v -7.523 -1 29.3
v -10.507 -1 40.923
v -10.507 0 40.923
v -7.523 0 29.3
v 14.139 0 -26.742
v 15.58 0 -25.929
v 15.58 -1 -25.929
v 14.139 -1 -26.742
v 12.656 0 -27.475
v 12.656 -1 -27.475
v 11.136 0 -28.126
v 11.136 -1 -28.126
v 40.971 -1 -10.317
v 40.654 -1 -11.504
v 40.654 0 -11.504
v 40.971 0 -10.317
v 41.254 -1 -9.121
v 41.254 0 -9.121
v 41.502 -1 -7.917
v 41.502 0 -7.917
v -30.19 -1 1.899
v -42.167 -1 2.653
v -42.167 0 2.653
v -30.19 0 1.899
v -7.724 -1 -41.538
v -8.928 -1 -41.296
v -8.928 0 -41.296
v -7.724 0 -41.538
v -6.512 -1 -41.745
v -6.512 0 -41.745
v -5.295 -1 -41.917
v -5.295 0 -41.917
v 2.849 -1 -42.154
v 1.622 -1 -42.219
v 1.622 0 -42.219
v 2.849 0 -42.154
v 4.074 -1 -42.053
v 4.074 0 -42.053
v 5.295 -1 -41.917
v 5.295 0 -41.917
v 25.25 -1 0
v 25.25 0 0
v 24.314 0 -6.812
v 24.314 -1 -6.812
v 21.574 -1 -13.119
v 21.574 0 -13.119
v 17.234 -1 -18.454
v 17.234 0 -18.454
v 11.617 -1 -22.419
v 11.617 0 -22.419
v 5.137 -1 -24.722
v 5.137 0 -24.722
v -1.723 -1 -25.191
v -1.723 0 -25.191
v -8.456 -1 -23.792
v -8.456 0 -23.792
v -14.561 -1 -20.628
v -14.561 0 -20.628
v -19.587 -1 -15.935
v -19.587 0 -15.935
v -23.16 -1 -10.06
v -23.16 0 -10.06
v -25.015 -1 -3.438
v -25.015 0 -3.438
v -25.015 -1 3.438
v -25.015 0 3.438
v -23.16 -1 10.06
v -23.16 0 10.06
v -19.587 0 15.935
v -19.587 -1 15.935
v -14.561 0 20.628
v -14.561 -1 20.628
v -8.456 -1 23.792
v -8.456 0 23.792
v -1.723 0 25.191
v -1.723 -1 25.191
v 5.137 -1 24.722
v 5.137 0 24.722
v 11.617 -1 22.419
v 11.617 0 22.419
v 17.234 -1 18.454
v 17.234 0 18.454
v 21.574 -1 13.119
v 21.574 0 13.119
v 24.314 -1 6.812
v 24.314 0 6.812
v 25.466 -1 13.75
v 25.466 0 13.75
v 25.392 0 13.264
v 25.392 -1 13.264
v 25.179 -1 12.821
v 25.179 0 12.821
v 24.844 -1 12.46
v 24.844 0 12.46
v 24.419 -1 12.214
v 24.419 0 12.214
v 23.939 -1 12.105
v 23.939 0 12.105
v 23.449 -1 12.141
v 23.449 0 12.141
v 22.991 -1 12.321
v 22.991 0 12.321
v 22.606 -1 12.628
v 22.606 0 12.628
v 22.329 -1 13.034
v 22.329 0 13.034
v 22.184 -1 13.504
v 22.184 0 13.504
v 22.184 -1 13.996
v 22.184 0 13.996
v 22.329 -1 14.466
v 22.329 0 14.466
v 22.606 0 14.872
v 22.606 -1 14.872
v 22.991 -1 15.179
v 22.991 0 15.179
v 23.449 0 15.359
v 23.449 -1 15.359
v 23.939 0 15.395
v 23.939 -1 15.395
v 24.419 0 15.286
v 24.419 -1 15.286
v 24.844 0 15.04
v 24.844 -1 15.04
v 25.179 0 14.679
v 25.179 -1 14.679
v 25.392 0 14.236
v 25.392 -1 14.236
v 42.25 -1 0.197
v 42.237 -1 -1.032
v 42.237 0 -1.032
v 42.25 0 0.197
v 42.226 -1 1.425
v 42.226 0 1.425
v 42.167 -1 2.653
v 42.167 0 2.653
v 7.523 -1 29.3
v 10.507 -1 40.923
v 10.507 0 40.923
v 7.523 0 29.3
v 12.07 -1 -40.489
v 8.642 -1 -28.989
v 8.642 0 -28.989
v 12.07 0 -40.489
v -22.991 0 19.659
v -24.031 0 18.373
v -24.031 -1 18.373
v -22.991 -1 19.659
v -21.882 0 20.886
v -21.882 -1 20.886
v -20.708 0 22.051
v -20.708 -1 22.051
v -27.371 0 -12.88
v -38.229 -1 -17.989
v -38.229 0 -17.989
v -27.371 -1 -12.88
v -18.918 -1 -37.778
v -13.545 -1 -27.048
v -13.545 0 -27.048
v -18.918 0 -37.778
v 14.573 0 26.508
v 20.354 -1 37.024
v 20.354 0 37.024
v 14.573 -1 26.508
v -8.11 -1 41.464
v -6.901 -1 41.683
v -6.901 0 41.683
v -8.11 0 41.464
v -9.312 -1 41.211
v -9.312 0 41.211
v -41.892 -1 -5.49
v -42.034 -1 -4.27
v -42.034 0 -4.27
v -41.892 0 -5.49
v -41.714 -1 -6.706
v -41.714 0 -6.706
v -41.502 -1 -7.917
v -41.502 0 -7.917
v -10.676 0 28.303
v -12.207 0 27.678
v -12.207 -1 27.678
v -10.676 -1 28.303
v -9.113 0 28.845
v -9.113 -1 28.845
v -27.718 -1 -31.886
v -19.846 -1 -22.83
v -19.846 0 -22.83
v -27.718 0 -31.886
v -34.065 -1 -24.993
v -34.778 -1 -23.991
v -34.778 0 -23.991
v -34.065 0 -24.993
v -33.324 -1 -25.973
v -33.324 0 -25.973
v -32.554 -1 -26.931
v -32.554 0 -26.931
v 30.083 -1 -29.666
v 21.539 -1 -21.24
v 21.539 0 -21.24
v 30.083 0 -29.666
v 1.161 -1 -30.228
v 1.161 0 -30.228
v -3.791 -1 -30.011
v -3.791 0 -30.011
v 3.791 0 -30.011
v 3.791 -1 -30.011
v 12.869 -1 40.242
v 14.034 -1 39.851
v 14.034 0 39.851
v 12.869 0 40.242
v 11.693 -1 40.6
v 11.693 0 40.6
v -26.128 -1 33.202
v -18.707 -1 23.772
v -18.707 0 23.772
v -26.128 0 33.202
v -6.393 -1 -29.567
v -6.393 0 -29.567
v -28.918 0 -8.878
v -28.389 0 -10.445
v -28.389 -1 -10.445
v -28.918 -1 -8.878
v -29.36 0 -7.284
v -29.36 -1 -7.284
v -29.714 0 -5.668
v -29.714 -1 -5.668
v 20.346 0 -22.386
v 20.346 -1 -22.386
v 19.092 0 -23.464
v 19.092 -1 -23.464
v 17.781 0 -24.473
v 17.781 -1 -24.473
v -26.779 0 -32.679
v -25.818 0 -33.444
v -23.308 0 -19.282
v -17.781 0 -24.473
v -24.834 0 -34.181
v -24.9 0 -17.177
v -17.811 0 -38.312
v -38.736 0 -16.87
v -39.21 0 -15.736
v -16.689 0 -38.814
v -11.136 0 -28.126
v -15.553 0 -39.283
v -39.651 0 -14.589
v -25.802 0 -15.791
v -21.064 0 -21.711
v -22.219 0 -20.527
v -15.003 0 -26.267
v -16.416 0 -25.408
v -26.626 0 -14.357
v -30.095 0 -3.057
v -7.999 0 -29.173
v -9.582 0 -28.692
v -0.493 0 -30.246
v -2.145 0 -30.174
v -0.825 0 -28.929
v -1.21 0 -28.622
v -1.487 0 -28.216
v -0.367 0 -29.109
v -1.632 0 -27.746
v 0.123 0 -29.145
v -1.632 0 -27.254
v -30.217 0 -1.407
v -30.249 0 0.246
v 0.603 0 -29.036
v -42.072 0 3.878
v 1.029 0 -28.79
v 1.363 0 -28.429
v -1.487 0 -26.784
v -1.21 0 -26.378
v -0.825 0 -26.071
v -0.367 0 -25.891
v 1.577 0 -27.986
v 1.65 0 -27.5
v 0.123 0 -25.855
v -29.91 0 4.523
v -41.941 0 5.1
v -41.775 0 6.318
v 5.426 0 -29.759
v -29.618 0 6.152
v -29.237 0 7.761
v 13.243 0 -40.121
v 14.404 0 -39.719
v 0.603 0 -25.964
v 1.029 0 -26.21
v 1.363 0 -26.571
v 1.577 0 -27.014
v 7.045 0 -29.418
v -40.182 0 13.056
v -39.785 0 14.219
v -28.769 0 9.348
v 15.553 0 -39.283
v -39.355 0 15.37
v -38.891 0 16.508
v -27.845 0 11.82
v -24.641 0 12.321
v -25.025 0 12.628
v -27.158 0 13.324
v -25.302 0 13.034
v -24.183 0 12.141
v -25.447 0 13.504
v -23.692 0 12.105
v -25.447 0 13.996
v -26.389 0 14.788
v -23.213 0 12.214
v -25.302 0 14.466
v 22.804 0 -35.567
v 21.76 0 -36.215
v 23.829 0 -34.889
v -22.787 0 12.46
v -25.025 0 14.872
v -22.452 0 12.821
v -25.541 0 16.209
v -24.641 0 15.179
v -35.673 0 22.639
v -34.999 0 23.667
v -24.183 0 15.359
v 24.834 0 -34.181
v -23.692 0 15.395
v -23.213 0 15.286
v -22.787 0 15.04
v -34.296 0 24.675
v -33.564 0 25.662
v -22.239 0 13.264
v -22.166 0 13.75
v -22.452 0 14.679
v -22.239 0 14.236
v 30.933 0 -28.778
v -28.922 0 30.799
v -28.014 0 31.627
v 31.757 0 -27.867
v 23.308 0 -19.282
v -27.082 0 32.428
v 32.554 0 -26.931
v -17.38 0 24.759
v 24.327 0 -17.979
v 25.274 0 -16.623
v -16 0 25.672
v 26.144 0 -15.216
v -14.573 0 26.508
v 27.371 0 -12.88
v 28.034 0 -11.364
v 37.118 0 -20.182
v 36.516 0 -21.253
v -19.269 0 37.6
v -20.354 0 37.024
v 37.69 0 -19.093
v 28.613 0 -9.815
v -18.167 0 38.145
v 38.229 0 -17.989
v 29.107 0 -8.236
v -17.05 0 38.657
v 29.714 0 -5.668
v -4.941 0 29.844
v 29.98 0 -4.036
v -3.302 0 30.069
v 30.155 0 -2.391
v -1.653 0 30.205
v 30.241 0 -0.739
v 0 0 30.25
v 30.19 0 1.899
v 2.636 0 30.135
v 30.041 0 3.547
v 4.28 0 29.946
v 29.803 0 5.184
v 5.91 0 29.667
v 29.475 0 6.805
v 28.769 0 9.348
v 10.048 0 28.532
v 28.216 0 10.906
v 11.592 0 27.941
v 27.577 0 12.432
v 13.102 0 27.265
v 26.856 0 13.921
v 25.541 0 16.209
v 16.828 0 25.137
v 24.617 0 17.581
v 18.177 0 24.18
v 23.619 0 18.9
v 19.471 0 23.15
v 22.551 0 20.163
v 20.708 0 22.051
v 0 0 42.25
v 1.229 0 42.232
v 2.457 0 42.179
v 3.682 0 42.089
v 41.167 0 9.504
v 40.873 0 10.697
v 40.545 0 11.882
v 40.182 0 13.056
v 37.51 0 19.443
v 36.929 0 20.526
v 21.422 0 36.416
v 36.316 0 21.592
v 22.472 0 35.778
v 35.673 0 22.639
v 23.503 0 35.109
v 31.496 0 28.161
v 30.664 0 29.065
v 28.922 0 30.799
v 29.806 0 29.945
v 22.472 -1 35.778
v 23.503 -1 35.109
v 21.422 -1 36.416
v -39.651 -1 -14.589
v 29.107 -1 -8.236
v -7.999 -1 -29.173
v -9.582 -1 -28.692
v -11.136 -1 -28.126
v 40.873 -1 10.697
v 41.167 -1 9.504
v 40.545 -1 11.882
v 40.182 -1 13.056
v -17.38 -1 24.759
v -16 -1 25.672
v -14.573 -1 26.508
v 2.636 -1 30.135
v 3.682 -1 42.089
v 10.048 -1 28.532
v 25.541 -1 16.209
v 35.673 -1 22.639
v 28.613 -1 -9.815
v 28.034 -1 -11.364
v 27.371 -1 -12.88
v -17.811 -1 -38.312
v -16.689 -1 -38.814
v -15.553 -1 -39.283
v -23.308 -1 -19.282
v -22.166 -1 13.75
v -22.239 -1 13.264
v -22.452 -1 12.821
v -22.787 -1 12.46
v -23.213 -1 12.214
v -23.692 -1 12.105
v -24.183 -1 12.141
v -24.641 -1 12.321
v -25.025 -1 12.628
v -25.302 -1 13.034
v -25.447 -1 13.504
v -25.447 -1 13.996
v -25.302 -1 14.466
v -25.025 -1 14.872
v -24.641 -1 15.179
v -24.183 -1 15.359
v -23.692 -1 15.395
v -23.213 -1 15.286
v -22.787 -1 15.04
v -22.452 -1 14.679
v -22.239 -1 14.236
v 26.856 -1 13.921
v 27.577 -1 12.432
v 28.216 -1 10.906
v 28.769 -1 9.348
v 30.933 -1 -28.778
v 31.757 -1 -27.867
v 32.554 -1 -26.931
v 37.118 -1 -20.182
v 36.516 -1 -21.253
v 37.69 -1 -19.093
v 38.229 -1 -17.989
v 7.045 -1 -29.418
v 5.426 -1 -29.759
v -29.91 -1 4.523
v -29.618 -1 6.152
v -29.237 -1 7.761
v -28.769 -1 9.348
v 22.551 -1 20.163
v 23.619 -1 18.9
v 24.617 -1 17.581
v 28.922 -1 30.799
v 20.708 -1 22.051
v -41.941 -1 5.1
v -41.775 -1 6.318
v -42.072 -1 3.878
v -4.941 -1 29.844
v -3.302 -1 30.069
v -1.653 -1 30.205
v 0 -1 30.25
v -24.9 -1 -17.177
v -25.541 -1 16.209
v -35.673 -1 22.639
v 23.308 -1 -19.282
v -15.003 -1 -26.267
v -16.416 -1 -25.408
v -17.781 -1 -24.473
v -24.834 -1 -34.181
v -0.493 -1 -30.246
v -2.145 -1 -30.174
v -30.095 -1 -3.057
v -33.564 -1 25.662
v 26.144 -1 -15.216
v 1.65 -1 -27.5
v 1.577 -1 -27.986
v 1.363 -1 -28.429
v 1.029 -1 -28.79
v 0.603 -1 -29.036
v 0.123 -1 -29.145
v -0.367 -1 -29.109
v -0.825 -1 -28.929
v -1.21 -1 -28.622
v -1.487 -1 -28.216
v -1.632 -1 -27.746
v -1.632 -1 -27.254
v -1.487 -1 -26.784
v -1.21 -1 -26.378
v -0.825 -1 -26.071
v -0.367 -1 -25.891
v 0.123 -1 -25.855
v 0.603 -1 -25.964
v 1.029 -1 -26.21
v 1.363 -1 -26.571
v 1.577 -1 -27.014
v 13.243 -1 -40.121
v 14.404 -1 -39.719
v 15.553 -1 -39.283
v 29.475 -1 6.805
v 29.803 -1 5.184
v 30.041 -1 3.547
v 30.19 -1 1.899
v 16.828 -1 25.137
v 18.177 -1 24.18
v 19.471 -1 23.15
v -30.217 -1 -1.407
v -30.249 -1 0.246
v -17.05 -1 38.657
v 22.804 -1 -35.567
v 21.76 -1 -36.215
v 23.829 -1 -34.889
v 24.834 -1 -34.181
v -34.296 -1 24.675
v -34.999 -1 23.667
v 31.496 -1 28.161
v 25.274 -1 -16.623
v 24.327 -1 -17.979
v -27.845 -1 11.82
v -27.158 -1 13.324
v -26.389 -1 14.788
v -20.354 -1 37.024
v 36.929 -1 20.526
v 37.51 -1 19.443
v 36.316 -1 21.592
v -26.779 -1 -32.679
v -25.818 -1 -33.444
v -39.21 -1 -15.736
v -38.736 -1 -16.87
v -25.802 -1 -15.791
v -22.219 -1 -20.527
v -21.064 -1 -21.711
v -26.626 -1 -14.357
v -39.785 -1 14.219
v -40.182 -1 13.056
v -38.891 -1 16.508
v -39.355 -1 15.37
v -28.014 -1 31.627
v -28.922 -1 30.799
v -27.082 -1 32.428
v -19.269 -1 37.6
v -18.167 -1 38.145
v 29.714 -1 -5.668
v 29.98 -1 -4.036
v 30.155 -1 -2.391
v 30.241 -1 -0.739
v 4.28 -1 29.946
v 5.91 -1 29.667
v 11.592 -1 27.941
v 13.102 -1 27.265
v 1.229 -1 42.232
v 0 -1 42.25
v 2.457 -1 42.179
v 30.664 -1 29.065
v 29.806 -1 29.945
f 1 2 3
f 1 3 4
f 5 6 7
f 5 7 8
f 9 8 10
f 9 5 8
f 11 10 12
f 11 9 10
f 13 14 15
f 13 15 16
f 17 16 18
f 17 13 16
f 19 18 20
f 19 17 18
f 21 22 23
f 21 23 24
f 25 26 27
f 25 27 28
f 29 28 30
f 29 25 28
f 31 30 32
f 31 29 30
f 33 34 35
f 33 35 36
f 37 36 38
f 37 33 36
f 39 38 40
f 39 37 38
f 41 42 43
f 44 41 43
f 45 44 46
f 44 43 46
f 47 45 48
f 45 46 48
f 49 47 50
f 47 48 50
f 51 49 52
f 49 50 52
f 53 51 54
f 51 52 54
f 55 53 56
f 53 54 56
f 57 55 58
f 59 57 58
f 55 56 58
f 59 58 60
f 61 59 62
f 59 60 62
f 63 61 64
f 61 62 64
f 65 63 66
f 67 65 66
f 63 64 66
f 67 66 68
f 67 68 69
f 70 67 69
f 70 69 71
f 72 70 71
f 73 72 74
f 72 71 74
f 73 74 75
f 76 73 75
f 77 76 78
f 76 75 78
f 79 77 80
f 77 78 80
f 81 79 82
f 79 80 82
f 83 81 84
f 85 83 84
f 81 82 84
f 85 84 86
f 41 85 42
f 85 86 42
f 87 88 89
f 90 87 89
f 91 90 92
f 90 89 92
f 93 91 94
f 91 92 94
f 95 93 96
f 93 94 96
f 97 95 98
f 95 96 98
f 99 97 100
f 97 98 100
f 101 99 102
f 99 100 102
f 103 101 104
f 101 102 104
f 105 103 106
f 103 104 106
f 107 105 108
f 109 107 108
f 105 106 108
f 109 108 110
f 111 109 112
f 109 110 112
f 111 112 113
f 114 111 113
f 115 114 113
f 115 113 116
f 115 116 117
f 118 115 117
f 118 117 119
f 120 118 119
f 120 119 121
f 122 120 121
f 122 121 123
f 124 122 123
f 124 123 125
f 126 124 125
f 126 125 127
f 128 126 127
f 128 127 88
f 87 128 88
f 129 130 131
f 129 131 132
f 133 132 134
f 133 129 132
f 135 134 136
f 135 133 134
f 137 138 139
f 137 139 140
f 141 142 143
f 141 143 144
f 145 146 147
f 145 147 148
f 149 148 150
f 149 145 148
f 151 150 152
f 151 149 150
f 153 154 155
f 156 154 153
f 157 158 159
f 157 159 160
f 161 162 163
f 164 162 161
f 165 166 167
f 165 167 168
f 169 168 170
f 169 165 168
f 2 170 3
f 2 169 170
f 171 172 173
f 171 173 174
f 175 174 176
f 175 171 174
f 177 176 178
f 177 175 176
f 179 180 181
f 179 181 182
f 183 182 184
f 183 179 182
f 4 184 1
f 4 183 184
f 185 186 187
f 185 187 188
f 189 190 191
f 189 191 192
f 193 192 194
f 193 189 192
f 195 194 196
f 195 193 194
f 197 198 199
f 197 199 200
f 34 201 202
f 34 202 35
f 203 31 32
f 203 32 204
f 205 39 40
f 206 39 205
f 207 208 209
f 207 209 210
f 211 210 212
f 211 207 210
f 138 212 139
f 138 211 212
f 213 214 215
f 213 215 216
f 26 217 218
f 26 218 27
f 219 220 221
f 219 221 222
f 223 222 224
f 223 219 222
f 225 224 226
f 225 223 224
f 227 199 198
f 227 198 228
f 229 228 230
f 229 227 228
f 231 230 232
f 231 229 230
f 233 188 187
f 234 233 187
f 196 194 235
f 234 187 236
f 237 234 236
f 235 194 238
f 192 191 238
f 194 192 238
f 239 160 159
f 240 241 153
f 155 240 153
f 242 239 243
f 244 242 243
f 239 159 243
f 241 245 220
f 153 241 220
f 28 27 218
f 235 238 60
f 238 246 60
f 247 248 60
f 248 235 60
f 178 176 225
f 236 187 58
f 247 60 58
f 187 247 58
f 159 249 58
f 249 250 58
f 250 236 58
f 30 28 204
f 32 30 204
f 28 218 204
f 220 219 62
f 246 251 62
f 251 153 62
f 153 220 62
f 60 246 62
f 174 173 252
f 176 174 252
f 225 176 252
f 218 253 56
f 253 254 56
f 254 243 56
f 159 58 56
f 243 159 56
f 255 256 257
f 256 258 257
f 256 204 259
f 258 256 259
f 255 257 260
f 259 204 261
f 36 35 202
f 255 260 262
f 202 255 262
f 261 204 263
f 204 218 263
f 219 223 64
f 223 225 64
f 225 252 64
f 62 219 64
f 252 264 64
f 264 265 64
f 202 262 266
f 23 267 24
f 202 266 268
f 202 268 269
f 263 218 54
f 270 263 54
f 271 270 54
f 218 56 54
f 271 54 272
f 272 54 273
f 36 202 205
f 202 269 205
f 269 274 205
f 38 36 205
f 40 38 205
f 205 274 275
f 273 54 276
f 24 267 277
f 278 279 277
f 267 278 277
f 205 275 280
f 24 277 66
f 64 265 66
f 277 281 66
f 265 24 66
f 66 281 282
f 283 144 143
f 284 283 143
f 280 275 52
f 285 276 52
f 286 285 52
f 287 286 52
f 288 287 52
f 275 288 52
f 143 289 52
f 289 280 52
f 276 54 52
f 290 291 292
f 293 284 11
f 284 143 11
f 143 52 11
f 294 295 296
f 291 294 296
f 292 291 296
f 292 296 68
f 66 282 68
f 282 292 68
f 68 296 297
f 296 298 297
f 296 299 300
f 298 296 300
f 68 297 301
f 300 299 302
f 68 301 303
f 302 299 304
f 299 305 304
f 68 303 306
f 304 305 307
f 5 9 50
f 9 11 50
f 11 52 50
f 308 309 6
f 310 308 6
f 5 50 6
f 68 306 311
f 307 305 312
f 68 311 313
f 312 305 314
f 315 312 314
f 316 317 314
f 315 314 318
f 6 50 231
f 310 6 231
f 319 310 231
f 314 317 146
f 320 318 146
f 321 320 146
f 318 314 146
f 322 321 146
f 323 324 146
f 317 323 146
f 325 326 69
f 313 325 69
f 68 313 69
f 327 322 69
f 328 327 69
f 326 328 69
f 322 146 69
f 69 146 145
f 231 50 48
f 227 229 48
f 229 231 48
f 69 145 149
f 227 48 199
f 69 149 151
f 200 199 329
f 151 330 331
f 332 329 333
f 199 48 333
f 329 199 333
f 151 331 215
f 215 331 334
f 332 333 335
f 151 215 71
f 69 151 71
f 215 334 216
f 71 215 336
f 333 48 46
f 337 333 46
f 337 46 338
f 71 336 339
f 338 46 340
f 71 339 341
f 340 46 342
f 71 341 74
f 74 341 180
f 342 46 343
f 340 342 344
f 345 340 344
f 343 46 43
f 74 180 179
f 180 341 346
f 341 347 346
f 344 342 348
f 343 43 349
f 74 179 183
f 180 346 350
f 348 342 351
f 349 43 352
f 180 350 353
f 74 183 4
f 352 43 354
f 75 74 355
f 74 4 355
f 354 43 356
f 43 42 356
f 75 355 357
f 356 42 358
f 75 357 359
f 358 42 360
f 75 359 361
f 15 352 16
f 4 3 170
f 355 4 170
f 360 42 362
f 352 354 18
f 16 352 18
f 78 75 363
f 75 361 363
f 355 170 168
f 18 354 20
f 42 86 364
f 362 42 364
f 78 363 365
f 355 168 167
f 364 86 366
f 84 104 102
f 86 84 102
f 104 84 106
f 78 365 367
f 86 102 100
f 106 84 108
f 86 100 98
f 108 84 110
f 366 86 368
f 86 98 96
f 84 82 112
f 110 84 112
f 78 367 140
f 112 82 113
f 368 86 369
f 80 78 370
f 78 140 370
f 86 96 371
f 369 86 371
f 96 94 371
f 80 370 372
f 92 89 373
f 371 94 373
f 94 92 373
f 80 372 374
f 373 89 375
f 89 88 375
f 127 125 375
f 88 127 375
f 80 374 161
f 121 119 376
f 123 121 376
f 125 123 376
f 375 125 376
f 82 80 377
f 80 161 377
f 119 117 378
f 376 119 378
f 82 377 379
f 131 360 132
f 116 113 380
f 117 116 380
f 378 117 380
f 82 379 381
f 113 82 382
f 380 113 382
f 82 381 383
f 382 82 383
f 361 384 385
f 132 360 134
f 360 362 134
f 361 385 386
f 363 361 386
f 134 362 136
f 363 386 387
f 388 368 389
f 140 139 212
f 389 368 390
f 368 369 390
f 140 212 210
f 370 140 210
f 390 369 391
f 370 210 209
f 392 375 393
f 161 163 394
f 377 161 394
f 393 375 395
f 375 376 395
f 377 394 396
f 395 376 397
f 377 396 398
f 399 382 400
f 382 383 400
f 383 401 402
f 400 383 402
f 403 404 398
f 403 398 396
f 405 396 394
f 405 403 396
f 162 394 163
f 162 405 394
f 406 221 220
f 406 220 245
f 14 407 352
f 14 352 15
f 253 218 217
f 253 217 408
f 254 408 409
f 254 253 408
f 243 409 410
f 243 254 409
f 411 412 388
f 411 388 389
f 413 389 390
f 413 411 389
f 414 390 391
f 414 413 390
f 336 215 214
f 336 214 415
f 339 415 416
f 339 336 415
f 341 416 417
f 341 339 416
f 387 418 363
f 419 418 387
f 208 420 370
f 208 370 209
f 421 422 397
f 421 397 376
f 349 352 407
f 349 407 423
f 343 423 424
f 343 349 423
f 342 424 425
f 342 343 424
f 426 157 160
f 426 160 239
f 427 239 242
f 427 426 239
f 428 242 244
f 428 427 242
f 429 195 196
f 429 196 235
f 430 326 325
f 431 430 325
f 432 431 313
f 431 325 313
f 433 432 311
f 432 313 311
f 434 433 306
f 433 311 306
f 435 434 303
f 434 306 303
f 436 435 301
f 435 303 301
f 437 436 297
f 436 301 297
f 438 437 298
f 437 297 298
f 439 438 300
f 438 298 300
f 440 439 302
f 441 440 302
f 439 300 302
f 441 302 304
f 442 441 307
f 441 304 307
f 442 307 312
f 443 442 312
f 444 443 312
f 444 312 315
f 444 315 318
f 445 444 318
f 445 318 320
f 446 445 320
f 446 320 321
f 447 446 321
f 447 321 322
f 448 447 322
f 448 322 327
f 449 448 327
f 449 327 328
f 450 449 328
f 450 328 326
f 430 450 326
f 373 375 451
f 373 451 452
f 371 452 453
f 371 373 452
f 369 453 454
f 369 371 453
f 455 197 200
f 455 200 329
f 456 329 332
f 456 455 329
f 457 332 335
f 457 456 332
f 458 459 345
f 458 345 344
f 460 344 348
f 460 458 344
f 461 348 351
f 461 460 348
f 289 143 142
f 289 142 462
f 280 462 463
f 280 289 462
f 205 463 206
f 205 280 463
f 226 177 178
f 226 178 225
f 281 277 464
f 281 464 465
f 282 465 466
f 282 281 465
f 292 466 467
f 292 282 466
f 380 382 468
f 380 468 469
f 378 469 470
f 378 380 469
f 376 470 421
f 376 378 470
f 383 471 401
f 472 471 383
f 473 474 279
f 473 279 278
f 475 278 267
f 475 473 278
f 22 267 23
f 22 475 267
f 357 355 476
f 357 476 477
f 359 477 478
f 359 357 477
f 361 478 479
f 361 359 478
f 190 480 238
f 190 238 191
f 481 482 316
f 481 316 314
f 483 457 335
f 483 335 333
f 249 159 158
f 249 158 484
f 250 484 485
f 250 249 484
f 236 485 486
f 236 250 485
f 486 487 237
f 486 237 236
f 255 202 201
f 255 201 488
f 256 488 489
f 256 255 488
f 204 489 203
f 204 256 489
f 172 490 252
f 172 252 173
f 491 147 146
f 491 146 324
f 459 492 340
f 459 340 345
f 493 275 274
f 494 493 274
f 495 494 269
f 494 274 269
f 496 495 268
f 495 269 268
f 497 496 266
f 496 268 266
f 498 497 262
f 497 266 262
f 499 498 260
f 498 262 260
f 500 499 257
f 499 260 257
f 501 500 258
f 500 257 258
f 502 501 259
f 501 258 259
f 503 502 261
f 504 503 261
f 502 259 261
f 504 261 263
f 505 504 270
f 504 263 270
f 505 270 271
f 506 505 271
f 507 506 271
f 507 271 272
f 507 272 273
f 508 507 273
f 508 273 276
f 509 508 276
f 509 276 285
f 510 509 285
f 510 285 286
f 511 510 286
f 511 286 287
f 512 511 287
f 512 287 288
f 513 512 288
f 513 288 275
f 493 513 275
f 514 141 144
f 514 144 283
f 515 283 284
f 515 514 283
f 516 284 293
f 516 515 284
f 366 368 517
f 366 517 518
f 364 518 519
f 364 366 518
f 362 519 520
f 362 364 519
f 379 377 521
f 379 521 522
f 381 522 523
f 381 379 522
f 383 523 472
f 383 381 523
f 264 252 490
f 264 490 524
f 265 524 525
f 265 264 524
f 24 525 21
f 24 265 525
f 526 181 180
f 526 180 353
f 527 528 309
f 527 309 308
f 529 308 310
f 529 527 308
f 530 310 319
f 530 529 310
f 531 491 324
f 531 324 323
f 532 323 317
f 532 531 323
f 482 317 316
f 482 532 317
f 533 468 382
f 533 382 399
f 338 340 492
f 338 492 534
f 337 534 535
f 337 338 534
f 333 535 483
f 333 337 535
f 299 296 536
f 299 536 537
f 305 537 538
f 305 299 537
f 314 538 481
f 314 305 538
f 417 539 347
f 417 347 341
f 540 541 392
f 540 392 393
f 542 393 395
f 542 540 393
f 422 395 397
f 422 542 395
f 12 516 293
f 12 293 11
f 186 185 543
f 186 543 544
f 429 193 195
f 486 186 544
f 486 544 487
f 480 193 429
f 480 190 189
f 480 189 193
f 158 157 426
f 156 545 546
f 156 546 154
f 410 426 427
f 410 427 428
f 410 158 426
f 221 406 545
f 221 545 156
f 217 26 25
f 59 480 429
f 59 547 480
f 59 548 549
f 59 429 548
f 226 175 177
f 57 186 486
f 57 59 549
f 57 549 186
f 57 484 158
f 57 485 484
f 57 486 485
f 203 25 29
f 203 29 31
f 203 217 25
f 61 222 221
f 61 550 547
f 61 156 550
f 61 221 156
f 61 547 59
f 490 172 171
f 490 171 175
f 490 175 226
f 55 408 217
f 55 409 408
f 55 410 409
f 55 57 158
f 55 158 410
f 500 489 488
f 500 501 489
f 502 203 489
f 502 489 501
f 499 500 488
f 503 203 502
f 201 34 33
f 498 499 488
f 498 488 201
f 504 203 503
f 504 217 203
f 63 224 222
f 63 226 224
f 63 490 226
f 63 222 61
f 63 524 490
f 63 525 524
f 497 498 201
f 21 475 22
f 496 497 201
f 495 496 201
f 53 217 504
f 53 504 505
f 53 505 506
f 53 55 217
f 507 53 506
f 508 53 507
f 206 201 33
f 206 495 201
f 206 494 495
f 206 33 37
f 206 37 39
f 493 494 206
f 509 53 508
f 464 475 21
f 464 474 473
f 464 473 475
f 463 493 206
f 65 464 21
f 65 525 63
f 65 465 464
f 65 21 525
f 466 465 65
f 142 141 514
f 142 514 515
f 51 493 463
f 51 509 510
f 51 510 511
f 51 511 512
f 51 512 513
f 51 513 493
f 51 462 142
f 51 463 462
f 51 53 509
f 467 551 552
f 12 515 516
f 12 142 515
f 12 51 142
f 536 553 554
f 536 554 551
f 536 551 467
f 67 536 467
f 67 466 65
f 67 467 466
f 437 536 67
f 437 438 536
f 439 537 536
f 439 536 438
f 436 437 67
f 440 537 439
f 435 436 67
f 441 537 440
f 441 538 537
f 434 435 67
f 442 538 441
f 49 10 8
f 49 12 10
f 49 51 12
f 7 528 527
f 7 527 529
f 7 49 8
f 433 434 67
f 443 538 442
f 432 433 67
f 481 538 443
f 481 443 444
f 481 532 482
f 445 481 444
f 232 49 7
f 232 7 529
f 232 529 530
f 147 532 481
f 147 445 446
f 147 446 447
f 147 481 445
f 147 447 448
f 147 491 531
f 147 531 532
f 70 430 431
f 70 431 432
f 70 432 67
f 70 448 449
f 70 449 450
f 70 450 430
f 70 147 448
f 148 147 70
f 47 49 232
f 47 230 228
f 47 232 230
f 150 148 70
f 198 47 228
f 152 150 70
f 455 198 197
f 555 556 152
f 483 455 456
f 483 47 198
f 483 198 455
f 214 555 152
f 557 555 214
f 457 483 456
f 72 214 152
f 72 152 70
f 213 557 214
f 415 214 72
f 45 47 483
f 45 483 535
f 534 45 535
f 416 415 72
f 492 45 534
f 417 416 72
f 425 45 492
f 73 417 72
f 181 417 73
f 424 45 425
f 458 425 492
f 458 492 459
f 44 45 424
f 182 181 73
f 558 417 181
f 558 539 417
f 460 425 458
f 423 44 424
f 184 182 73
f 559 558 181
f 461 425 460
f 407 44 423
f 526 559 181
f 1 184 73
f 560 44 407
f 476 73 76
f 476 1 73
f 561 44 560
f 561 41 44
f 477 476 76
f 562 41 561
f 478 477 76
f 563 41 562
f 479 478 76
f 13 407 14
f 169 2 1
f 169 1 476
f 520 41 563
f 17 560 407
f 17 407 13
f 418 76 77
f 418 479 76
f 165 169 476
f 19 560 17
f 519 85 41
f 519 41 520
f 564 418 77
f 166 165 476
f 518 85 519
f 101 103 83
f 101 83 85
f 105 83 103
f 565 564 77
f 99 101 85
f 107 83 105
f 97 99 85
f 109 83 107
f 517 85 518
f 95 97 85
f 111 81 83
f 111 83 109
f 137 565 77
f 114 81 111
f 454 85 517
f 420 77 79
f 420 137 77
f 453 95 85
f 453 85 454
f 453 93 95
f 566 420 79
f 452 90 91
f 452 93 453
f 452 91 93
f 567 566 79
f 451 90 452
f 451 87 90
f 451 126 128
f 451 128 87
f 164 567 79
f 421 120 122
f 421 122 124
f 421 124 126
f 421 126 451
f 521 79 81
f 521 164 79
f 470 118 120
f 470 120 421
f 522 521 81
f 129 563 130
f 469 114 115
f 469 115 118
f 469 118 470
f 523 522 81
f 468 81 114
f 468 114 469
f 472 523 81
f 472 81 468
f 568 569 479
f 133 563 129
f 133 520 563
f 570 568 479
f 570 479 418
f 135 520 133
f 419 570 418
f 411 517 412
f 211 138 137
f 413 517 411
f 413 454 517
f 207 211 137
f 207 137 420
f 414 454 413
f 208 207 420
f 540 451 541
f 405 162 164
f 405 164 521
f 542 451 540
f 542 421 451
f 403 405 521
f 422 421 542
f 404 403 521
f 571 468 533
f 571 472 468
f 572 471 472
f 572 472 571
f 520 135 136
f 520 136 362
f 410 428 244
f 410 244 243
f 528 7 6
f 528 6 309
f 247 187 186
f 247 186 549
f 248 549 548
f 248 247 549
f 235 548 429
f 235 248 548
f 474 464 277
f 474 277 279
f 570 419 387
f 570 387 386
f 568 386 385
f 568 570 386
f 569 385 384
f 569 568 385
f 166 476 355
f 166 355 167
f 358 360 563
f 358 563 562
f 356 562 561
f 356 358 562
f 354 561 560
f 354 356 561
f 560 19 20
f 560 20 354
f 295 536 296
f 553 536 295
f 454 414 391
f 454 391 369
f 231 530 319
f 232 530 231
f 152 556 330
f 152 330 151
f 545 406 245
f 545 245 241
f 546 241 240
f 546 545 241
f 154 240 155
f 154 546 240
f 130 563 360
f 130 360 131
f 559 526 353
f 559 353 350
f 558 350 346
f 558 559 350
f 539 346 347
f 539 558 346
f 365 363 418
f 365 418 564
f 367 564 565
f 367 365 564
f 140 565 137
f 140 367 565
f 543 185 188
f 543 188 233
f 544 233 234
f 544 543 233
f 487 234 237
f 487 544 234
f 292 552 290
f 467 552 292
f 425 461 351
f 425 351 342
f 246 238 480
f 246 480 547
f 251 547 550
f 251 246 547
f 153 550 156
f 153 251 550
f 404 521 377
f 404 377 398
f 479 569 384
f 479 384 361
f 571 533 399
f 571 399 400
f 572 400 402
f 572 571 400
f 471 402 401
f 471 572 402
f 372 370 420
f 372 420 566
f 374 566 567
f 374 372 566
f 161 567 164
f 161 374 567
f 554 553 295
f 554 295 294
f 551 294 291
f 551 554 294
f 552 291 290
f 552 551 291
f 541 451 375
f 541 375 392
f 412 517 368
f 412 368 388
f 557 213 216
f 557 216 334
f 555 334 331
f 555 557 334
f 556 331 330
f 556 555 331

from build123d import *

# Parameters (mm, degrees)
SKETCH1_R           = 30.25
SKETCH1_R_2         = 25.25
EXTRUDE_THIN1_DEPTH = 1
SKETCH2_R           = 1.65
CUT_EXTRUDE3_DEPTH  = 10
BOSS_EXTRUDE1_DEPTH = 1


with BuildPart() as part:
    # Sketch1 → Extrude-Thin1 (new body)
    with BuildSketch(Plane(origin=(0, 0, 0), x_dir=(1, 0, 0), z_dir=(0, 1, 0))):
        Circle(SKETCH1_R)
        Circle(SKETCH1_R_2, mode=Mode.SUBTRACT)
    extrude(amount=-EXTRUDE_THIN1_DEPTH)

    # Sketch2 → Cut-Extrude3 (cut)
    with BuildSketch(Plane(origin=(0, 0, 0), x_dir=(1, 0, 0), z_dir=(0, 1, 0))):
        with Locations((0, 27.5)):
            Circle(SKETCH2_R)
        with Locations((23.815698604, -13.75)):
            Circle(SKETCH2_R)
        with Locations((-23.815698604, -13.75)):
            Circle(SKETCH2_R)
    extrude(amount=-CUT_EXTRUDE3_DEPTH, mode=Mode.SUBTRACT)

    # Sketch5 → Boss-Extrude1 (add)
    with BuildSketch(Plane.XZ.offset(1)):
        with BuildLine():
            Line((0, 42.25), (0, 30.25))
            ThreePointArc((0, 30.25), (1.319486468, 30.221208703), (2.636461218, 30.134889617))
            Line((2.636461218, 30.134889617), (3.682330131, 42.089225994))
            ThreePointArc((3.682330131, 42.089225994), (1.842919116, 42.209787362), (0, 42.25))
        make_face()
        with BuildLine():
            Line((10.507147733, 40.922638558), (7.522869087, 29.299640624))
            ThreePointArc((7.522869087, 29.299640624), (8.793741356, 28.943610918), (10.047874239, 28.532485403))
            Line((10.047874239, 28.532485403), (14.033807822, 39.851157298))
            ThreePointArc((14.033807822, 39.851157298), (12.28216768, 40.425373926), (10.507147733, 40.922638558))
        make_face()
        with BuildLine():
            Line((20.354092731, 37.023957232), (14.573048642, 26.508277071))
            ThreePointArc((14.573048642, 26.508277071), (15.715453134, 25.847379612), (16.827942369, 25.137280196))
            Line((16.827942369, 25.137280196), (23.503489755, 35.109093827))
            ThreePointArc((23.503489755, 35.109093827), (21.949682477, 36.100885573), (20.354092731, 37.023957232))
        make_face()
        with BuildLine():
            Line((28.922115225, 30.798924509), (20.707549954, 22.051300979))
            ThreePointArc((20.707549954, 22.051300979), (21.649705195, 21.127062384), (22.55064899, 20.162607225))
            Line((22.55064899, 20.162607225), (31.496360987, 28.160996868))
            ThreePointArc((31.496360987, 28.160996868), (30.238017999, 29.508045809), (28.922115225, 30.798924509))
        make_face()
        with BuildLine():
            Line((35.672854852, 22.638682088), (25.540919746, 16.208760548))
            ThreePointArc((25.540919746, 16.208760548), (26.223626655, 15.079254128), (26.8564154, 13.92104349))
            Line((26.8564154, 13.92104349), (37.510200022, 19.443440907))
            ThreePointArc((37.510200022, 19.443440907), (36.626387643, 21.061107005), (35.672854852, 22.638682088))
        make_face()
        with BuildLine():
            Line((40.182137813, 13.055968012), (28.769459618, 9.34776408))
            ThreePointArc((28.769459618, 9.34776408), (29.14982121, 8.083960876), (29.47469446, 6.804769394))
            Line((29.47469446, 6.804769394), (41.167135237, 9.504182046))
            ThreePointArc((41.167135237, 9.504182046), (40.713386648, 11.290821389), (40.182137813, 13.055968012))
        make_face()
        with BuildLine():
            Line((42.166629276, 2.65289945), (30.190308535, 1.899413216))
            ThreePointArc((30.190308535, 1.899413216), (30.244425292, 0.580722633), (30.240970066, -0.739073389))
            Line((30.240970066, -0.739073389), (42.237387943, -1.032259527))
            ThreePointArc((42.237387943, -1.032259527), (42.242213837, 0.811091941), (42.166629276, 2.65289945))
        make_face()
        with BuildLine():
            Line((41.501636343, -7.916860541), (29.714189335, -5.668284766))
            ThreePointArc((29.714189335, -5.668284766), (29.438660902, -6.95900455), (29.107094304, -8.236477473))
            Line((29.107094304, -8.236477473), (40.653710227, -11.503840437))
            ThreePointArc((40.653710227, -11.503840437), (41.116807375, -9.719601396), (41.501636343, -7.916860541))
        make_face()
        with BuildLine():
            Line((38.228942967, -17.989175069), (27.371018337, -12.87982357))
            ThreePointArc((27.371018337, -12.87982357), (26.783157179, -14.061471883), (26.144312759, -15.216353386))
            Line((26.144312759, -15.216353386), (36.515610383, -21.252592745))
            ThreePointArc((36.515610383, -21.252592745), (37.407880688, -19.639576432), (38.228942967, -17.989175069))
        make_face()
        with BuildLine():
            Line((32.554184507, -26.931163567), (23.308025594, -19.28207569))
            ThreePointArc((23.308025594, -19.28207569), (22.44476919, -20.280405224), (21.538787891, -21.240129853))
            Line((21.538787891, -21.240129853), (30.083100443, -29.665966489))
            ThreePointArc((30.083100443, -29.665966489), (31.348479281, -28.325524651), (32.554184507, -26.931163567))
        make_face()
        with BuildLine():
            Line((24.833926909, -34.180968012), (17.780503882, -24.47276408))
            ThreePointArc((17.780503882, -24.47276408), (16.696093806, -25.225046118), (15.579901766, -25.929310846))
            Line((15.579901766, -25.929310846), (21.760358665, -36.215318455))
            ThreePointArc((21.760358665, -36.215318455), (23.319337629, -35.231675982), (24.833926909, -34.180968012))
        make_face()
        with BuildLine():
            Line((15.553262351, -39.283056529), (11.135767719, -28.125738698))
            ThreePointArc((11.135767719, -28.125738698), (9.898341444, -28.584704593), (8.642073114, -28.989257878))
            Line((8.642073114, -28.989257878), (12.070333523, -40.489128771))
            ThreePointArc((12.070333523, -40.489128771), (13.824956232, -39.924091539), (15.553262351, -39.283056529))
        make_face()
        with BuildLine():
            Line((5.295329118, -41.916846131), (3.791330315, -30.011469715))
            ThreePointArc((3.791330315, -30.011469715), (2.478639886, -30.148280951), (1.161231225, -30.227703221))
            Line((1.161231225, -30.227703221), (1.621884934, -42.218858218))
            ThreePointArc((1.621884934, -42.218858218), (3.46190199, -42.107929593), (5.295329118, -41.916846131))
        make_face()
        with BuildLine():
            Line((-5.295329118, -41.916846131), (-3.791330315, -30.011469715))
            ThreePointArc((-3.791330315, -30.011469715), (-5.096803732, -29.81752994), (-6.392575093, -29.566830802))
            Line((-6.392575093, -29.566830802), (-8.92847265, -41.295821534))
            ThreePointArc((-8.92847265, -41.295821534), (-7.118676287, -41.645971569), (-5.295329118, -41.916846131))
        make_face()
        with BuildLine():
            Line((-15.553262351, -39.283056529), (-11.135767719, -28.125738698))
            ThreePointArc((-11.135767719, -28.125738698), (-12.351996427, -27.613233861), (-13.544712407, -27.048165664))
            Line((-13.544712407, -27.048165664), (-18.917821461, -37.778016506))
            ThreePointArc((-18.917821461, -37.778016506), (-17.251961951, -38.567243988), (-15.553262351, -39.283056529))
        make_face()
        with BuildLine():
            Line((-24.833926909, -34.180968012), (-17.780503882, -24.47276408))
            ThreePointArc((-17.780503882, -24.47276408), (-18.831067758, -23.673896745), (-19.845785627, -22.829964802))
            Line((-19.845785627, -22.829964802), (-27.718493975, -31.886479764))
            ThreePointArc((-27.718493975, -31.886479764), (-26.301243398, -33.065194627), (-24.833926909, -34.180968012))
        make_face()
        with BuildLine():
            Line((-32.554184507, -26.931163567), (-23.308025594, -19.28207569))
            ThreePointArc((-23.308025594, -19.28207569), (-24.126913847, -18.247041629), (-24.899875148, -17.177273288))
            Line((-24.899875148, -17.177273288), (-34.777511571, -23.991398228))
            ThreePointArc((-34.777511571, -23.991398228), (-33.697920993, -25.485537482), (-32.554184507, -26.931163567))
        make_face()
        with BuildLine():
            Line((-38.228942967, -17.989175069), (-27.371018337, -12.87982357))
            ThreePointArc((-27.371018337, -12.87982357), (-27.906777206, -11.67365778), (-28.389413938, -10.44527052))
            Line((-28.389413938, -10.44527052), (-39.651330212, -14.588848908))
            ThreePointArc((-39.651330212, -14.588848908), (-38.97723428, -16.304530288), (-38.228942967, -17.989175069))
        make_face()
        with BuildLine():
            Line((-41.501636343, -7.916860541), (-29.714189335, -5.668284766))
            ThreePointArc((-29.714189335, -5.668284766), (-29.933155119, -4.36677508), (-30.095141442, -3.05695299))
            Line((-30.095141442, -3.05695299), (-42.033709948, -4.269628556))
            ThreePointArc((-42.033709948, -4.269628556), (-41.807464588, -6.099049492), (-41.501636343, -7.916860541))
        make_face()
        with BuildLine():
            Line((-42.166629276, 2.65289945), (-30.190308535, 1.899413216))
            ThreePointArc((-30.190308535, 1.899413216), (-30.07872281, 3.214488158), (-29.909880527, 4.523444139))
            Line((-29.909880527, 4.523444139), (-41.774957099, 6.31786826))
            ThreePointArc((-41.774957099, 6.31786826), (-42.01077814, 4.489657014), (-42.166629276, 2.65289945))
        make_face()
        with BuildLine():
            Line((-40.182137813, 13.055968012), (-28.769459618, 9.34776408))
            ThreePointArc((-28.769459618, 9.34776408), (-28.334333725, 10.593773283), (-27.845271817, 11.819616637))
            Line((-27.845271817, 11.819616637), (-38.891330058, 16.508390179))
            ThreePointArc((-38.891330058, 16.508390179), (-39.574399996, 14.796261858), (-40.182137813, 13.055968012))
        make_face()
        with BuildLine():
            Line((-35.672854852, 22.638682088), (-25.540919746, 16.208760548))
            ThreePointArc((-25.540919746, 16.208760548), (-24.809594245, 17.307412672), (-24.031042271, 18.373119152))
            Line((-24.031042271, 18.373119152), (-33.564017718, 25.661629228))
            ThreePointArc((-33.564017718, 25.661629228), (-34.651416756, 24.173163153), (-35.672854852, 22.638682088))
        make_face()
        with BuildLine():
            Line((-28.922115225, 30.798924509), (-20.707549954, 22.051300979))
            ThreePointArc((-20.707549954, 22.051300979), (-19.725976716, 22.93356367), (-18.70685396, 23.772171019))
            Line((-18.70685396, 23.772171019), (-26.127754704, 33.202453737))
            ThreePointArc((-26.127754704, 33.202453737), (-27.551157562, 32.031175704), (-28.922115225, 30.798924509))
        make_face()
        with BuildLine():
            Line((-20.354092731, 37.023957232), (-14.573048642, 26.508277071))
            ThreePointArc((-14.573048642, 26.508277071), (-13.402903522, 27.118714519), (-12.207245215, 27.677529952))
            Line((-12.207245215, 27.677529952), (-17.049788771, 38.657045967))
            ThreePointArc((-17.049788771, 38.657045967), (-18.719757812, 37.876551684), (-20.354092731, 37.023957232))
        make_face()
        with BuildLine():
            Line((-10.507147733, 40.922638558), (-7.522869087, 29.299640624))
            ThreePointArc((-7.522869087, 29.299640624), (-6.237676608, 29.599896799), (-4.940610358, 29.843807889))
            Line((-4.940610358, 29.843807889), (-6.900521905, 41.682673828))
            ThreePointArc((-6.900521905, 41.682673828), (-8.712126833, 41.342004621), (-10.507147733, 40.922638558))
        make_face()
    extrude(amount=-BOSS_EXTRUDE1_DEPTH)


solid = part.part
